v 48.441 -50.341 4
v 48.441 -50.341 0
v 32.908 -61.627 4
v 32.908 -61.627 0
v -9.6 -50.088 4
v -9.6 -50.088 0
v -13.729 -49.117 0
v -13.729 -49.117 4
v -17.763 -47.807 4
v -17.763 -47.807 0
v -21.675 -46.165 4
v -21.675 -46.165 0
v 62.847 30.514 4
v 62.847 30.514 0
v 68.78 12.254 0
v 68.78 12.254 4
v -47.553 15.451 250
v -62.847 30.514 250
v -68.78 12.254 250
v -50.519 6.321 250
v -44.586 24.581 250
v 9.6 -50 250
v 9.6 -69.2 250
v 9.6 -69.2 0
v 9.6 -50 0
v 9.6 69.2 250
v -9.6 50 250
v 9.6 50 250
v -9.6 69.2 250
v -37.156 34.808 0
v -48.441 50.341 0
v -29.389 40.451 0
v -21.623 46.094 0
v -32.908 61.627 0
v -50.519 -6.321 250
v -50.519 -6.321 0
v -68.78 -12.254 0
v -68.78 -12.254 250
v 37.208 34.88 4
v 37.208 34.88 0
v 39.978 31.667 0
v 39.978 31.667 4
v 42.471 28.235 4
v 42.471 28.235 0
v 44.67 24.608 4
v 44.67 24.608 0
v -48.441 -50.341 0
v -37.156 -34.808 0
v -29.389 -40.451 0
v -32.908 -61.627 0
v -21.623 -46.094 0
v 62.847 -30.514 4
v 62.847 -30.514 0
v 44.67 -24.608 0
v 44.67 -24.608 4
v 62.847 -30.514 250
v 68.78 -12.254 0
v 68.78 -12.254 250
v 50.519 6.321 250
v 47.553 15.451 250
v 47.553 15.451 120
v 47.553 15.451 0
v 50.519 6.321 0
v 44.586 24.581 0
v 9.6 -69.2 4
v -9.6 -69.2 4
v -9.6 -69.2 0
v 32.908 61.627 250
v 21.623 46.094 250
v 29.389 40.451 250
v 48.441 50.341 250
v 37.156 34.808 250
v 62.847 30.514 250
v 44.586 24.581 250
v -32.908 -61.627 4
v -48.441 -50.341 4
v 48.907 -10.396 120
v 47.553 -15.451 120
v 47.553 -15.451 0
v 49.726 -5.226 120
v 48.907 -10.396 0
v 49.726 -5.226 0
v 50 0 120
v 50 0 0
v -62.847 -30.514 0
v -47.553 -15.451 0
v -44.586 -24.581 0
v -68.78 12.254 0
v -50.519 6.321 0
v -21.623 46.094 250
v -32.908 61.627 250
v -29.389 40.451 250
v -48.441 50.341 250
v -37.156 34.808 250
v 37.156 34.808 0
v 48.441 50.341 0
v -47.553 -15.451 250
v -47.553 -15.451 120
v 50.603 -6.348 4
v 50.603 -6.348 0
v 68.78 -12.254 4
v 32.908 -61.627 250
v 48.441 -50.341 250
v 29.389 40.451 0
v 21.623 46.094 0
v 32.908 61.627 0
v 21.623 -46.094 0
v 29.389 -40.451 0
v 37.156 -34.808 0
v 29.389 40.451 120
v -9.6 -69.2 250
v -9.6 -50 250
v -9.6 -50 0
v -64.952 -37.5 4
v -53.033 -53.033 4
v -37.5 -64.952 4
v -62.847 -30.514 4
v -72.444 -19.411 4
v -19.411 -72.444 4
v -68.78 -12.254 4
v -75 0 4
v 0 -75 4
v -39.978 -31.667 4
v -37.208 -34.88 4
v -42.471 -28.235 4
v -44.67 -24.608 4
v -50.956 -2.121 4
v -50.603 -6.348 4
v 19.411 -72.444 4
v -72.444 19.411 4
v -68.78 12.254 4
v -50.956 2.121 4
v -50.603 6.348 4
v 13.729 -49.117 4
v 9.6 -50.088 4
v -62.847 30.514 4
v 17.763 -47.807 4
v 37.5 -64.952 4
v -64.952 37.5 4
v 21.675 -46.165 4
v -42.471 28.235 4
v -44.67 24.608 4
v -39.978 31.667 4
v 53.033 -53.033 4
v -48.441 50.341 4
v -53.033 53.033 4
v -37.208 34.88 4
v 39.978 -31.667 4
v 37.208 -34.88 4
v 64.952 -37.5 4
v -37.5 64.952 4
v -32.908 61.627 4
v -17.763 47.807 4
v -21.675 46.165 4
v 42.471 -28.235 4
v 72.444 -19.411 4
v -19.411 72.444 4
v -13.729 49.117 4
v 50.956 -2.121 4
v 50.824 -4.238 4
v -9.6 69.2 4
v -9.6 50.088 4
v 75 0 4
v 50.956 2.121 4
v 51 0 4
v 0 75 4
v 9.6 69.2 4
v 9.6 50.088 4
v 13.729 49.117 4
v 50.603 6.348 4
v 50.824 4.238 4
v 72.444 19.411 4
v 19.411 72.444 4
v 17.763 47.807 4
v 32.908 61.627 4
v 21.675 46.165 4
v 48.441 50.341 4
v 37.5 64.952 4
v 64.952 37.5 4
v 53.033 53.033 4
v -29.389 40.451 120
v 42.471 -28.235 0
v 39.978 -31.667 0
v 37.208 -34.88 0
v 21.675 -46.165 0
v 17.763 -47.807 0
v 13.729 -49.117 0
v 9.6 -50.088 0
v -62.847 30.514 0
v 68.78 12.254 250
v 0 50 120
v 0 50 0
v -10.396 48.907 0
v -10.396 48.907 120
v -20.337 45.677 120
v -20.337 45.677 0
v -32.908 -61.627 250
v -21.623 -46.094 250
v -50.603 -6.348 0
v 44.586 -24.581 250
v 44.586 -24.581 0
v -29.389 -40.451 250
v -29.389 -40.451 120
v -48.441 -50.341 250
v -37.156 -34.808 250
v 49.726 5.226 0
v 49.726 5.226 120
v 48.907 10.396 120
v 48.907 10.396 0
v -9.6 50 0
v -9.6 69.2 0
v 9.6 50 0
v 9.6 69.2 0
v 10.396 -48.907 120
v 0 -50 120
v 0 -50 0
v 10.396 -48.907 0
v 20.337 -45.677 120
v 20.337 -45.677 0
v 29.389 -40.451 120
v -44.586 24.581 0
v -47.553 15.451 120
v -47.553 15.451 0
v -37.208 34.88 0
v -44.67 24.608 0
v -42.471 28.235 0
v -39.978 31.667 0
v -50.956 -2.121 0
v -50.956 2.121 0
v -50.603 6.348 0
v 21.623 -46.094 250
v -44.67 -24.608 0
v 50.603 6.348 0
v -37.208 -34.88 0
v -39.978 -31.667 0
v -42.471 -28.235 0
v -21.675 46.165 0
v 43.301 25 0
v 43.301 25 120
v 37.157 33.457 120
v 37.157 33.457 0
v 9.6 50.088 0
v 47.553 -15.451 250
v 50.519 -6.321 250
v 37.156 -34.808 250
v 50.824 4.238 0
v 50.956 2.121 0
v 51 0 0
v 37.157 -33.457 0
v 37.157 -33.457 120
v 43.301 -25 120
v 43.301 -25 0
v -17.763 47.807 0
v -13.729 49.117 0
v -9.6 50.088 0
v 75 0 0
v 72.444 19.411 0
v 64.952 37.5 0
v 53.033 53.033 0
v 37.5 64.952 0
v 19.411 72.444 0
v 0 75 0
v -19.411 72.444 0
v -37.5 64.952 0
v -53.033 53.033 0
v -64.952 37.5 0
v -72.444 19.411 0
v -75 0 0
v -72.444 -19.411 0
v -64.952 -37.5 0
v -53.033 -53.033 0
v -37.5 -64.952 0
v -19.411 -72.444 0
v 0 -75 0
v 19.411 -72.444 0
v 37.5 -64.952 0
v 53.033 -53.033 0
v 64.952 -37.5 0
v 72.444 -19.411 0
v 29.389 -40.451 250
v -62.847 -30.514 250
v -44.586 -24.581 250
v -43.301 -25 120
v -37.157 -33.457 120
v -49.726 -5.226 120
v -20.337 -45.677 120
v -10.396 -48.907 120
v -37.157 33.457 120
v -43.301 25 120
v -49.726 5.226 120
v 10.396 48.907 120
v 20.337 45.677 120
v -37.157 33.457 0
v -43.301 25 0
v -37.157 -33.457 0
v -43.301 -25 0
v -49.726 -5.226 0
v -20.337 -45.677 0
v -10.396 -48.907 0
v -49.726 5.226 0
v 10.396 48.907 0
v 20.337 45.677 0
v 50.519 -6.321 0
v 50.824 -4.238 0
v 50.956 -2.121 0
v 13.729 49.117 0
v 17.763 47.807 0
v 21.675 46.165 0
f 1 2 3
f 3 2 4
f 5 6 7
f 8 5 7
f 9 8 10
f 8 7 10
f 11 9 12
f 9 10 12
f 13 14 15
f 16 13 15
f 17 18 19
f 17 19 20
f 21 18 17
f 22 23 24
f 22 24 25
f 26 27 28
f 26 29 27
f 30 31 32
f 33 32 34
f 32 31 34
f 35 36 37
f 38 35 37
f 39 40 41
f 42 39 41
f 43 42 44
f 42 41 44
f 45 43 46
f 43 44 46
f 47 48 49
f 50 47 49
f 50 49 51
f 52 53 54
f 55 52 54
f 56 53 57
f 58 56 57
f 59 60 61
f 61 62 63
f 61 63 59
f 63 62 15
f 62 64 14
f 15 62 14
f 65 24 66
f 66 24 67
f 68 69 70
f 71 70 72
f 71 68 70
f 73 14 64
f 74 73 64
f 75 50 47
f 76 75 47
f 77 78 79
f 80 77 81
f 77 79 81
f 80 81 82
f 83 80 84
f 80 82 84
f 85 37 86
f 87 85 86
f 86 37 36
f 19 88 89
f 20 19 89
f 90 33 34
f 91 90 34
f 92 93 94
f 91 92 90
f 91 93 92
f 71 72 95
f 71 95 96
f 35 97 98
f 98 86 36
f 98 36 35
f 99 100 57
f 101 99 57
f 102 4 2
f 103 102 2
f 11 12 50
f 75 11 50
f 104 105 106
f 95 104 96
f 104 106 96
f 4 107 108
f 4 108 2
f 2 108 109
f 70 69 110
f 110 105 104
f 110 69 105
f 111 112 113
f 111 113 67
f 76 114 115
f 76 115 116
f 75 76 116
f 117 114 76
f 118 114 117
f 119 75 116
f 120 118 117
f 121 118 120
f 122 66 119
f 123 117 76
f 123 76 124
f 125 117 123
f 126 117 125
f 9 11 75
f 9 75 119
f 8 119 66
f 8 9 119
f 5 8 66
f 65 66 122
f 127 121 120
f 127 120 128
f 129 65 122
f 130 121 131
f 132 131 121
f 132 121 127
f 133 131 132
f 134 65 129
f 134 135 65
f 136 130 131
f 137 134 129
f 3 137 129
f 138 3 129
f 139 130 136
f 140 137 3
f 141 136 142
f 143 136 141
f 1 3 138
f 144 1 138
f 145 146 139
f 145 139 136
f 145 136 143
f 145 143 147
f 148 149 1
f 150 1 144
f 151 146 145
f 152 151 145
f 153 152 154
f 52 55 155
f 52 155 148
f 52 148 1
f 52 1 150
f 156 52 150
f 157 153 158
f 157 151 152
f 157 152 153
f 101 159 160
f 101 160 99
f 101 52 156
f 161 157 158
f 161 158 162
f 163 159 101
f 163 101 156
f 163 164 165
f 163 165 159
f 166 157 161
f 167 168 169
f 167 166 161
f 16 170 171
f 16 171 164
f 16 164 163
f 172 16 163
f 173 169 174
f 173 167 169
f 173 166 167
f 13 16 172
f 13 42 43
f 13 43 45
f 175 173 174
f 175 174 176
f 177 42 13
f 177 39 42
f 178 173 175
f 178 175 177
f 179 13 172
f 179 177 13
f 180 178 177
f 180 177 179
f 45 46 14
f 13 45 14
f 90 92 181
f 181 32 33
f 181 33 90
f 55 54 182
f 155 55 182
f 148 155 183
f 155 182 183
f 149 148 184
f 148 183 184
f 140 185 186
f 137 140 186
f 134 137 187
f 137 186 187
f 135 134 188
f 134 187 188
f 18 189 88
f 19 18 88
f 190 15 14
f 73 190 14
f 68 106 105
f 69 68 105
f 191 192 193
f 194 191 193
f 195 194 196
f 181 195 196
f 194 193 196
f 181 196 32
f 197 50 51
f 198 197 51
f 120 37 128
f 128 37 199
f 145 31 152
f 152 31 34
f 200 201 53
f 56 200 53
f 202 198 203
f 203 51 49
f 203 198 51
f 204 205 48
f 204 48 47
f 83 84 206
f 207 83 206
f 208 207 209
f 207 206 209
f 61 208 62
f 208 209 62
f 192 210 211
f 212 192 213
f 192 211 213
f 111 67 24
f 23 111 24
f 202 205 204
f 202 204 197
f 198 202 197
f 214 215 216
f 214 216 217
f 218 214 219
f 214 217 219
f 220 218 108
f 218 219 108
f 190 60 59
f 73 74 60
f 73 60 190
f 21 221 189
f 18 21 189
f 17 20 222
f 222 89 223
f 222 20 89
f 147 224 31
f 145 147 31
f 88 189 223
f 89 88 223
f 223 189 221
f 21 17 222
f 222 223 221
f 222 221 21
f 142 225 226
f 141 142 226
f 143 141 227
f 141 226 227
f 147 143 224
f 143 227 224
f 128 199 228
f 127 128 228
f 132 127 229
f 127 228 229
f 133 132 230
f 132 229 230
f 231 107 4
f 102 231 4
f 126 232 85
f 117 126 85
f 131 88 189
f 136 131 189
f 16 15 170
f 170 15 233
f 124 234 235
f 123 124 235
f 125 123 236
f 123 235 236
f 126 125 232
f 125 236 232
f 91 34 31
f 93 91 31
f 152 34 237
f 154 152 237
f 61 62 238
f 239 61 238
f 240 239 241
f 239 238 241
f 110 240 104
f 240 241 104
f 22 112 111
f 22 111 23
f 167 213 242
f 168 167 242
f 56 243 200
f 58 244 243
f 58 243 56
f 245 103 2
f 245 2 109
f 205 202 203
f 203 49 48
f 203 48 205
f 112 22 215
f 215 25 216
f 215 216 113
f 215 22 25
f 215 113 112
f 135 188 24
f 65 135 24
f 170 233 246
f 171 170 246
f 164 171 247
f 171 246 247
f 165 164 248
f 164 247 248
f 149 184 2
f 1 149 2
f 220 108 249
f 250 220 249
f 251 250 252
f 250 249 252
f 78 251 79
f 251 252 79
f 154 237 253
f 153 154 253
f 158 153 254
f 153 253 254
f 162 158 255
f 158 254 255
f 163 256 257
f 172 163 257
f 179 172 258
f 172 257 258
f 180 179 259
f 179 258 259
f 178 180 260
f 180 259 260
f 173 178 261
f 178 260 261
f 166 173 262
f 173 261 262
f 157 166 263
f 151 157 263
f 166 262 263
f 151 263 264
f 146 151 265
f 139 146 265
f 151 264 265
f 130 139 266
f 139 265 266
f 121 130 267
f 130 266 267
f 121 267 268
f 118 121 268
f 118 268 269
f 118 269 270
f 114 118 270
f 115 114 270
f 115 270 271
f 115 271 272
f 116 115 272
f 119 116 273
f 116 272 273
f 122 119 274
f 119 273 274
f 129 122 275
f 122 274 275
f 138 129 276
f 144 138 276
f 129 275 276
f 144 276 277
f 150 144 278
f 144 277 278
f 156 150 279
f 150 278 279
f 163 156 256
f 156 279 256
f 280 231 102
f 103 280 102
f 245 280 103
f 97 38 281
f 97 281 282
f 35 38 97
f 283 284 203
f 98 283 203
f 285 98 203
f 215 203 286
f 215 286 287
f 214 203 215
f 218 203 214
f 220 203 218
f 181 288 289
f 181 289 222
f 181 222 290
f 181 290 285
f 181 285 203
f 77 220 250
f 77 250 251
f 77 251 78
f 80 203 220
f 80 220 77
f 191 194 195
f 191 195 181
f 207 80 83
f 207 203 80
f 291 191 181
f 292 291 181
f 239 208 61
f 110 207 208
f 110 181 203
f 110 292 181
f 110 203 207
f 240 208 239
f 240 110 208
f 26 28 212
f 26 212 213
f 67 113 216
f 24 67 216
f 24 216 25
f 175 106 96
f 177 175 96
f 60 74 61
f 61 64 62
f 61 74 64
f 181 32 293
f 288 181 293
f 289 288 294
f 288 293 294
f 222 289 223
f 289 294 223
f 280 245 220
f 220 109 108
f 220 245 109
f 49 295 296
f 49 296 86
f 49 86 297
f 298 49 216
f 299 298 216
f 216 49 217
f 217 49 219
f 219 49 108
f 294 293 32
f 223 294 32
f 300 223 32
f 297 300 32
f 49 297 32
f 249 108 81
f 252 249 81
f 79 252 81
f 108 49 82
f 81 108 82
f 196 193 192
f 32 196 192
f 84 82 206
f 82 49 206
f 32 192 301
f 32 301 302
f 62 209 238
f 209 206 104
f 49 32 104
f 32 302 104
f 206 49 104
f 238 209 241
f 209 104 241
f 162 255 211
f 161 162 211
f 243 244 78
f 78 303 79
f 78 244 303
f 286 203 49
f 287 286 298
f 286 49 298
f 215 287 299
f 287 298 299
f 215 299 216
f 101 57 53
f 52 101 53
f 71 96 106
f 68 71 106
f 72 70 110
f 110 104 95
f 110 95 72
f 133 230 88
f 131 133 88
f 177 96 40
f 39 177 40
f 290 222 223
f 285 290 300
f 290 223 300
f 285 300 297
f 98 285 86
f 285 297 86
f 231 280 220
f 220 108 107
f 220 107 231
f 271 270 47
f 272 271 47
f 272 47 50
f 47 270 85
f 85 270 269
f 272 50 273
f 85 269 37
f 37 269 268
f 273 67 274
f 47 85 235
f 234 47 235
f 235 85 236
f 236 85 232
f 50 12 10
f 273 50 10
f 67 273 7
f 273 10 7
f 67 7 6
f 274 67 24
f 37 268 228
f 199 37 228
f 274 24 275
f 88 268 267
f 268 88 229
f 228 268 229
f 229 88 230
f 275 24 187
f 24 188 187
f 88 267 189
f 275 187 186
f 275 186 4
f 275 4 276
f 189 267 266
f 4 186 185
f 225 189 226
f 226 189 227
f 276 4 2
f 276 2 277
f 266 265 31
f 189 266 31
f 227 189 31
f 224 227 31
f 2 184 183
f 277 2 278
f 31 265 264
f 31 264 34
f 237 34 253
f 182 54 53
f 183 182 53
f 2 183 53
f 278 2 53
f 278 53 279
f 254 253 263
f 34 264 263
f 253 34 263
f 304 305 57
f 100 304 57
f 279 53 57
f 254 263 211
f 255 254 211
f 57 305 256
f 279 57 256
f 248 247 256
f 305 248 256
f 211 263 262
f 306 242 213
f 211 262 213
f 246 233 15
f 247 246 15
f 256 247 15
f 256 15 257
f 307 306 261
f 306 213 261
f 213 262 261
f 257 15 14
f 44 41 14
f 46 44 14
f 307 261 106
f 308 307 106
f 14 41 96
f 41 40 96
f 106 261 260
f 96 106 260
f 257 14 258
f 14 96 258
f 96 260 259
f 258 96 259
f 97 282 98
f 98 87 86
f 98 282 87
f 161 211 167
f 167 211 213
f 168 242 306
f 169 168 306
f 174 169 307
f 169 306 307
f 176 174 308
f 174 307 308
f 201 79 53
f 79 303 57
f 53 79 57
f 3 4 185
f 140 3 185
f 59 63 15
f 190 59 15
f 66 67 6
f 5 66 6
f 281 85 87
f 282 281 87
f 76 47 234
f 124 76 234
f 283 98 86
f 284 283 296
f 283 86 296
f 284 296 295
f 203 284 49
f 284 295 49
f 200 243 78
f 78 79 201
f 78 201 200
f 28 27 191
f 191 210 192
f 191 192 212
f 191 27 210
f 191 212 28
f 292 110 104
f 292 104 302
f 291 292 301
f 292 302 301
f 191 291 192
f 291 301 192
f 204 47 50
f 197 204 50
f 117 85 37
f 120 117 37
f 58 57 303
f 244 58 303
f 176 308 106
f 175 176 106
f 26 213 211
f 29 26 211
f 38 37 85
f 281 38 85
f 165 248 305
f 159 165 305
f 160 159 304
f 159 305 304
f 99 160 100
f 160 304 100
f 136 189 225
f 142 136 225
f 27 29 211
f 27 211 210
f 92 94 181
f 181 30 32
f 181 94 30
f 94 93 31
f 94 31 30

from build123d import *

# Parameters (mm, degrees)
F1_DEPTH = 120
F2_DEPTH = 250
F3_R     = 75
F4_DEPTH = 4


with BuildPart() as f1:
    # F0 (on Top) → F1 (new body)
    with BuildSketch(Plane.XY):
        with BuildLine():
            ThreePointArc((47.552826, -15.45085), (49.384417, -7.821723), (50, 0))
            ThreePointArc((50, 0), (49.384417, 7.821723), (47.552826, 15.45085))
            ThreePointArc((47.552826, 15.45085), (40.45085, 29.389263), (29.389262, 40.45085))
            ThreePointArc((29.389262, 40.45085), (15.450849, 47.552826), (0, 50))
            ThreePointArc((0, 50), (-15.45085, 47.552826), (-29.389262, 40.45085))
            ThreePointArc((-29.389262, 40.45085), (-40.45085, 29.389263), (-47.552826, 15.45085))
            ThreePointArc((-47.552826, 15.45085), (-50, 1e-06), (-47.552826, -15.450849))
            ThreePointArc((-47.552826, -15.450849), (-40.45085, -29.389262), (-29.389263, -40.450849))
            ThreePointArc((-29.389263, -40.450849), (-15.45085, -47.552826), (0, -50))
            ThreePointArc((0, -50), (15.450849, -47.552826), (29.389262, -40.45085))
            ThreePointArc((29.389262, -40.45085), (40.45085, -29.389263), (47.552826, -15.45085))
        make_face()
    extrude(amount=F1_DEPTH)

    # F0 (on Top) → F2 (join)
    with BuildSketch(Plane.XY):
        Polygon((-21.622699, -46.093588), (-29.389263, -40.450849), (-37.155826, -34.808111), (-48.441303, -50.341238), (-32.908176, -61.626714), align=None)
        Polygon((-44.586263, -24.580992), (-47.552826, -15.450849), (-50.519389, -6.320707), (-68.779674, -12.253833), (-62.846548, -30.514119), align=None)
        Polygon((9.6, -50), (0, -50), (-9.6, -50), (-9.6, -69.2), (9.6, -69.2), align=None)
        Polygon((37.155826, -34.808111), (29.389262, -40.45085), (21.622699, -46.093588), (32.908176, -61.626714), (48.441303, -50.341238), align=None)
        Polygon((50.519389, -6.320707), (47.552826, -15.45085), (44.586263, -24.580992), (62.846548, -30.514119), (68.779674, -12.253833), align=None)
        Polygon((44.586263, 24.580992), (47.552826, 15.45085), (50.519389, 6.320707), (68.779674, 12.253833), (62.846548, 30.514119), align=None)
        Polygon((21.622699, 46.093588), (29.389262, 40.45085), (37.155826, 34.808111), (48.441303, 50.341238), (32.908176, 61.626714), align=None)
        Polygon((-9.6, 50), (0, 50), (9.6, 50), (9.6, 69.2), (-9.6, 69.2), align=None)
        Polygon((-37.155826, 34.808111), (-29.389262, 40.45085), (-21.622699, 46.093588), (-32.908176, 61.626714), (-48.441303, 50.341238), align=None)
        Polygon((-50.519389, 6.320707), (-47.552826, 15.45085), (-44.586263, 24.580992), (-62.846548, 30.514119), (-68.779674, 12.253833), align=None)
    extrude(amount=F2_DEPTH)


with BuildPart() as f4:
    # F3 (on Top) → F4 (new body)
    with BuildSketch(Plane.XY):
        Circle(F3_R)
        with BuildLine():
            Line((9.6, 69.2), (9.6, 50.088322))
            ThreePointArc((9.6, 50.088322), (15.759867, 48.503882), (21.674614, 46.165042))
            Line((21.674614, 46.165042), (32.908176, 61.626714))
            Line((32.908176, 61.626714), (48.441303, 50.341238))
            Line((48.441303, 50.341238), (37.20774, 34.879565))
            ThreePointArc((37.20774, 34.879565), (41.259867, 29.977048), (44.670262, 24.608285))
            Line((44.670262, 24.608285), (62.846548, 30.514119))
            Line((62.846548, 30.514119), (68.779674, 12.253833))
            Line((68.779674, 12.253833), (50.603388, 6.348))
            ThreePointArc((50.603388, 6.348), (50.90075, 3.180189), (51, 0))
            ThreePointArc((51, 0), (50.90075, -3.180189), (50.603388, -6.348))
            Line((50.603388, -6.348), (68.779674, -12.253833))
            Line((68.779674, -12.253833), (62.846548, -30.514119))
            Line((62.846548, -30.514119), (44.670262, -24.608285))
            ThreePointArc((44.670262, -24.608285), (41.259867, -29.977048), (37.20774, -34.879565))
            Line((37.20774, -34.879565), (48.441303, -50.341238))
            Line((48.441303, -50.341238), (32.908176, -61.626714))
            Line((32.908176, -61.626714), (21.674614, -46.165042))
            ThreePointArc((21.674614, -46.165042), (15.759867, -48.503882), (9.6, -50.088322))
            Line((9.6, -50.088322), (9.6, -69.2))
            Line((9.6, -69.2), (-9.6, -69.2))
            Line((-9.6, -69.2), (-9.6, -50.088322))
            ThreePointArc((-9.6, -50.088322), (-15.759867, -48.503882), (-21.674614, -46.165042))
            Line((-21.674614, -46.165042), (-32.908176, -61.626714))
            Line((-32.908176, -61.626714), (-48.441303, -50.341238))
            Line((-48.441303, -50.341238), (-37.20774, -34.879565))
            ThreePointArc((-37.20774, -34.879565), (-41.259867, -29.977048), (-44.670262, -24.608285))
            Line((-44.670262, -24.608285), (-62.846548, -30.514119))
            Line((-62.846548, -30.514119), (-68.779674, -12.253833))
            Line((-68.779674, -12.253833), (-50.603388, -6.348))
            ThreePointArc((-50.603388, -6.348), (-51, 0), (-50.603388, 6.348))
            Line((-50.603388, 6.348), (-68.779674, 12.253833))
            Line((-68.779674, 12.253833), (-62.846548, 30.514119))
            Line((-62.846548, 30.514119), (-44.670262, 24.608285))
            ThreePointArc((-44.670262, 24.608285), (-41.259867, 29.977048), (-37.20774, 34.879565))
            Line((-37.20774, 34.879565), (-48.441303, 50.341238))
            Line((-48.441303, 50.341238), (-32.908176, 61.626714))
            Line((-32.908176, 61.626714), (-21.674614, 46.165042))
            ThreePointArc((-21.674614, 46.165042), (-15.759867, 48.503882), (-9.6, 50.088322))
            Line((-9.6, 50.088322), (-9.6, 69.2))
            Line((-9.6, 69.2), (9.6, 69.2))
        make_face(mode=Mode.SUBTRACT)
    extrude(amount=F4_DEPTH)


solid = Compound([f1.part, f4.part])
